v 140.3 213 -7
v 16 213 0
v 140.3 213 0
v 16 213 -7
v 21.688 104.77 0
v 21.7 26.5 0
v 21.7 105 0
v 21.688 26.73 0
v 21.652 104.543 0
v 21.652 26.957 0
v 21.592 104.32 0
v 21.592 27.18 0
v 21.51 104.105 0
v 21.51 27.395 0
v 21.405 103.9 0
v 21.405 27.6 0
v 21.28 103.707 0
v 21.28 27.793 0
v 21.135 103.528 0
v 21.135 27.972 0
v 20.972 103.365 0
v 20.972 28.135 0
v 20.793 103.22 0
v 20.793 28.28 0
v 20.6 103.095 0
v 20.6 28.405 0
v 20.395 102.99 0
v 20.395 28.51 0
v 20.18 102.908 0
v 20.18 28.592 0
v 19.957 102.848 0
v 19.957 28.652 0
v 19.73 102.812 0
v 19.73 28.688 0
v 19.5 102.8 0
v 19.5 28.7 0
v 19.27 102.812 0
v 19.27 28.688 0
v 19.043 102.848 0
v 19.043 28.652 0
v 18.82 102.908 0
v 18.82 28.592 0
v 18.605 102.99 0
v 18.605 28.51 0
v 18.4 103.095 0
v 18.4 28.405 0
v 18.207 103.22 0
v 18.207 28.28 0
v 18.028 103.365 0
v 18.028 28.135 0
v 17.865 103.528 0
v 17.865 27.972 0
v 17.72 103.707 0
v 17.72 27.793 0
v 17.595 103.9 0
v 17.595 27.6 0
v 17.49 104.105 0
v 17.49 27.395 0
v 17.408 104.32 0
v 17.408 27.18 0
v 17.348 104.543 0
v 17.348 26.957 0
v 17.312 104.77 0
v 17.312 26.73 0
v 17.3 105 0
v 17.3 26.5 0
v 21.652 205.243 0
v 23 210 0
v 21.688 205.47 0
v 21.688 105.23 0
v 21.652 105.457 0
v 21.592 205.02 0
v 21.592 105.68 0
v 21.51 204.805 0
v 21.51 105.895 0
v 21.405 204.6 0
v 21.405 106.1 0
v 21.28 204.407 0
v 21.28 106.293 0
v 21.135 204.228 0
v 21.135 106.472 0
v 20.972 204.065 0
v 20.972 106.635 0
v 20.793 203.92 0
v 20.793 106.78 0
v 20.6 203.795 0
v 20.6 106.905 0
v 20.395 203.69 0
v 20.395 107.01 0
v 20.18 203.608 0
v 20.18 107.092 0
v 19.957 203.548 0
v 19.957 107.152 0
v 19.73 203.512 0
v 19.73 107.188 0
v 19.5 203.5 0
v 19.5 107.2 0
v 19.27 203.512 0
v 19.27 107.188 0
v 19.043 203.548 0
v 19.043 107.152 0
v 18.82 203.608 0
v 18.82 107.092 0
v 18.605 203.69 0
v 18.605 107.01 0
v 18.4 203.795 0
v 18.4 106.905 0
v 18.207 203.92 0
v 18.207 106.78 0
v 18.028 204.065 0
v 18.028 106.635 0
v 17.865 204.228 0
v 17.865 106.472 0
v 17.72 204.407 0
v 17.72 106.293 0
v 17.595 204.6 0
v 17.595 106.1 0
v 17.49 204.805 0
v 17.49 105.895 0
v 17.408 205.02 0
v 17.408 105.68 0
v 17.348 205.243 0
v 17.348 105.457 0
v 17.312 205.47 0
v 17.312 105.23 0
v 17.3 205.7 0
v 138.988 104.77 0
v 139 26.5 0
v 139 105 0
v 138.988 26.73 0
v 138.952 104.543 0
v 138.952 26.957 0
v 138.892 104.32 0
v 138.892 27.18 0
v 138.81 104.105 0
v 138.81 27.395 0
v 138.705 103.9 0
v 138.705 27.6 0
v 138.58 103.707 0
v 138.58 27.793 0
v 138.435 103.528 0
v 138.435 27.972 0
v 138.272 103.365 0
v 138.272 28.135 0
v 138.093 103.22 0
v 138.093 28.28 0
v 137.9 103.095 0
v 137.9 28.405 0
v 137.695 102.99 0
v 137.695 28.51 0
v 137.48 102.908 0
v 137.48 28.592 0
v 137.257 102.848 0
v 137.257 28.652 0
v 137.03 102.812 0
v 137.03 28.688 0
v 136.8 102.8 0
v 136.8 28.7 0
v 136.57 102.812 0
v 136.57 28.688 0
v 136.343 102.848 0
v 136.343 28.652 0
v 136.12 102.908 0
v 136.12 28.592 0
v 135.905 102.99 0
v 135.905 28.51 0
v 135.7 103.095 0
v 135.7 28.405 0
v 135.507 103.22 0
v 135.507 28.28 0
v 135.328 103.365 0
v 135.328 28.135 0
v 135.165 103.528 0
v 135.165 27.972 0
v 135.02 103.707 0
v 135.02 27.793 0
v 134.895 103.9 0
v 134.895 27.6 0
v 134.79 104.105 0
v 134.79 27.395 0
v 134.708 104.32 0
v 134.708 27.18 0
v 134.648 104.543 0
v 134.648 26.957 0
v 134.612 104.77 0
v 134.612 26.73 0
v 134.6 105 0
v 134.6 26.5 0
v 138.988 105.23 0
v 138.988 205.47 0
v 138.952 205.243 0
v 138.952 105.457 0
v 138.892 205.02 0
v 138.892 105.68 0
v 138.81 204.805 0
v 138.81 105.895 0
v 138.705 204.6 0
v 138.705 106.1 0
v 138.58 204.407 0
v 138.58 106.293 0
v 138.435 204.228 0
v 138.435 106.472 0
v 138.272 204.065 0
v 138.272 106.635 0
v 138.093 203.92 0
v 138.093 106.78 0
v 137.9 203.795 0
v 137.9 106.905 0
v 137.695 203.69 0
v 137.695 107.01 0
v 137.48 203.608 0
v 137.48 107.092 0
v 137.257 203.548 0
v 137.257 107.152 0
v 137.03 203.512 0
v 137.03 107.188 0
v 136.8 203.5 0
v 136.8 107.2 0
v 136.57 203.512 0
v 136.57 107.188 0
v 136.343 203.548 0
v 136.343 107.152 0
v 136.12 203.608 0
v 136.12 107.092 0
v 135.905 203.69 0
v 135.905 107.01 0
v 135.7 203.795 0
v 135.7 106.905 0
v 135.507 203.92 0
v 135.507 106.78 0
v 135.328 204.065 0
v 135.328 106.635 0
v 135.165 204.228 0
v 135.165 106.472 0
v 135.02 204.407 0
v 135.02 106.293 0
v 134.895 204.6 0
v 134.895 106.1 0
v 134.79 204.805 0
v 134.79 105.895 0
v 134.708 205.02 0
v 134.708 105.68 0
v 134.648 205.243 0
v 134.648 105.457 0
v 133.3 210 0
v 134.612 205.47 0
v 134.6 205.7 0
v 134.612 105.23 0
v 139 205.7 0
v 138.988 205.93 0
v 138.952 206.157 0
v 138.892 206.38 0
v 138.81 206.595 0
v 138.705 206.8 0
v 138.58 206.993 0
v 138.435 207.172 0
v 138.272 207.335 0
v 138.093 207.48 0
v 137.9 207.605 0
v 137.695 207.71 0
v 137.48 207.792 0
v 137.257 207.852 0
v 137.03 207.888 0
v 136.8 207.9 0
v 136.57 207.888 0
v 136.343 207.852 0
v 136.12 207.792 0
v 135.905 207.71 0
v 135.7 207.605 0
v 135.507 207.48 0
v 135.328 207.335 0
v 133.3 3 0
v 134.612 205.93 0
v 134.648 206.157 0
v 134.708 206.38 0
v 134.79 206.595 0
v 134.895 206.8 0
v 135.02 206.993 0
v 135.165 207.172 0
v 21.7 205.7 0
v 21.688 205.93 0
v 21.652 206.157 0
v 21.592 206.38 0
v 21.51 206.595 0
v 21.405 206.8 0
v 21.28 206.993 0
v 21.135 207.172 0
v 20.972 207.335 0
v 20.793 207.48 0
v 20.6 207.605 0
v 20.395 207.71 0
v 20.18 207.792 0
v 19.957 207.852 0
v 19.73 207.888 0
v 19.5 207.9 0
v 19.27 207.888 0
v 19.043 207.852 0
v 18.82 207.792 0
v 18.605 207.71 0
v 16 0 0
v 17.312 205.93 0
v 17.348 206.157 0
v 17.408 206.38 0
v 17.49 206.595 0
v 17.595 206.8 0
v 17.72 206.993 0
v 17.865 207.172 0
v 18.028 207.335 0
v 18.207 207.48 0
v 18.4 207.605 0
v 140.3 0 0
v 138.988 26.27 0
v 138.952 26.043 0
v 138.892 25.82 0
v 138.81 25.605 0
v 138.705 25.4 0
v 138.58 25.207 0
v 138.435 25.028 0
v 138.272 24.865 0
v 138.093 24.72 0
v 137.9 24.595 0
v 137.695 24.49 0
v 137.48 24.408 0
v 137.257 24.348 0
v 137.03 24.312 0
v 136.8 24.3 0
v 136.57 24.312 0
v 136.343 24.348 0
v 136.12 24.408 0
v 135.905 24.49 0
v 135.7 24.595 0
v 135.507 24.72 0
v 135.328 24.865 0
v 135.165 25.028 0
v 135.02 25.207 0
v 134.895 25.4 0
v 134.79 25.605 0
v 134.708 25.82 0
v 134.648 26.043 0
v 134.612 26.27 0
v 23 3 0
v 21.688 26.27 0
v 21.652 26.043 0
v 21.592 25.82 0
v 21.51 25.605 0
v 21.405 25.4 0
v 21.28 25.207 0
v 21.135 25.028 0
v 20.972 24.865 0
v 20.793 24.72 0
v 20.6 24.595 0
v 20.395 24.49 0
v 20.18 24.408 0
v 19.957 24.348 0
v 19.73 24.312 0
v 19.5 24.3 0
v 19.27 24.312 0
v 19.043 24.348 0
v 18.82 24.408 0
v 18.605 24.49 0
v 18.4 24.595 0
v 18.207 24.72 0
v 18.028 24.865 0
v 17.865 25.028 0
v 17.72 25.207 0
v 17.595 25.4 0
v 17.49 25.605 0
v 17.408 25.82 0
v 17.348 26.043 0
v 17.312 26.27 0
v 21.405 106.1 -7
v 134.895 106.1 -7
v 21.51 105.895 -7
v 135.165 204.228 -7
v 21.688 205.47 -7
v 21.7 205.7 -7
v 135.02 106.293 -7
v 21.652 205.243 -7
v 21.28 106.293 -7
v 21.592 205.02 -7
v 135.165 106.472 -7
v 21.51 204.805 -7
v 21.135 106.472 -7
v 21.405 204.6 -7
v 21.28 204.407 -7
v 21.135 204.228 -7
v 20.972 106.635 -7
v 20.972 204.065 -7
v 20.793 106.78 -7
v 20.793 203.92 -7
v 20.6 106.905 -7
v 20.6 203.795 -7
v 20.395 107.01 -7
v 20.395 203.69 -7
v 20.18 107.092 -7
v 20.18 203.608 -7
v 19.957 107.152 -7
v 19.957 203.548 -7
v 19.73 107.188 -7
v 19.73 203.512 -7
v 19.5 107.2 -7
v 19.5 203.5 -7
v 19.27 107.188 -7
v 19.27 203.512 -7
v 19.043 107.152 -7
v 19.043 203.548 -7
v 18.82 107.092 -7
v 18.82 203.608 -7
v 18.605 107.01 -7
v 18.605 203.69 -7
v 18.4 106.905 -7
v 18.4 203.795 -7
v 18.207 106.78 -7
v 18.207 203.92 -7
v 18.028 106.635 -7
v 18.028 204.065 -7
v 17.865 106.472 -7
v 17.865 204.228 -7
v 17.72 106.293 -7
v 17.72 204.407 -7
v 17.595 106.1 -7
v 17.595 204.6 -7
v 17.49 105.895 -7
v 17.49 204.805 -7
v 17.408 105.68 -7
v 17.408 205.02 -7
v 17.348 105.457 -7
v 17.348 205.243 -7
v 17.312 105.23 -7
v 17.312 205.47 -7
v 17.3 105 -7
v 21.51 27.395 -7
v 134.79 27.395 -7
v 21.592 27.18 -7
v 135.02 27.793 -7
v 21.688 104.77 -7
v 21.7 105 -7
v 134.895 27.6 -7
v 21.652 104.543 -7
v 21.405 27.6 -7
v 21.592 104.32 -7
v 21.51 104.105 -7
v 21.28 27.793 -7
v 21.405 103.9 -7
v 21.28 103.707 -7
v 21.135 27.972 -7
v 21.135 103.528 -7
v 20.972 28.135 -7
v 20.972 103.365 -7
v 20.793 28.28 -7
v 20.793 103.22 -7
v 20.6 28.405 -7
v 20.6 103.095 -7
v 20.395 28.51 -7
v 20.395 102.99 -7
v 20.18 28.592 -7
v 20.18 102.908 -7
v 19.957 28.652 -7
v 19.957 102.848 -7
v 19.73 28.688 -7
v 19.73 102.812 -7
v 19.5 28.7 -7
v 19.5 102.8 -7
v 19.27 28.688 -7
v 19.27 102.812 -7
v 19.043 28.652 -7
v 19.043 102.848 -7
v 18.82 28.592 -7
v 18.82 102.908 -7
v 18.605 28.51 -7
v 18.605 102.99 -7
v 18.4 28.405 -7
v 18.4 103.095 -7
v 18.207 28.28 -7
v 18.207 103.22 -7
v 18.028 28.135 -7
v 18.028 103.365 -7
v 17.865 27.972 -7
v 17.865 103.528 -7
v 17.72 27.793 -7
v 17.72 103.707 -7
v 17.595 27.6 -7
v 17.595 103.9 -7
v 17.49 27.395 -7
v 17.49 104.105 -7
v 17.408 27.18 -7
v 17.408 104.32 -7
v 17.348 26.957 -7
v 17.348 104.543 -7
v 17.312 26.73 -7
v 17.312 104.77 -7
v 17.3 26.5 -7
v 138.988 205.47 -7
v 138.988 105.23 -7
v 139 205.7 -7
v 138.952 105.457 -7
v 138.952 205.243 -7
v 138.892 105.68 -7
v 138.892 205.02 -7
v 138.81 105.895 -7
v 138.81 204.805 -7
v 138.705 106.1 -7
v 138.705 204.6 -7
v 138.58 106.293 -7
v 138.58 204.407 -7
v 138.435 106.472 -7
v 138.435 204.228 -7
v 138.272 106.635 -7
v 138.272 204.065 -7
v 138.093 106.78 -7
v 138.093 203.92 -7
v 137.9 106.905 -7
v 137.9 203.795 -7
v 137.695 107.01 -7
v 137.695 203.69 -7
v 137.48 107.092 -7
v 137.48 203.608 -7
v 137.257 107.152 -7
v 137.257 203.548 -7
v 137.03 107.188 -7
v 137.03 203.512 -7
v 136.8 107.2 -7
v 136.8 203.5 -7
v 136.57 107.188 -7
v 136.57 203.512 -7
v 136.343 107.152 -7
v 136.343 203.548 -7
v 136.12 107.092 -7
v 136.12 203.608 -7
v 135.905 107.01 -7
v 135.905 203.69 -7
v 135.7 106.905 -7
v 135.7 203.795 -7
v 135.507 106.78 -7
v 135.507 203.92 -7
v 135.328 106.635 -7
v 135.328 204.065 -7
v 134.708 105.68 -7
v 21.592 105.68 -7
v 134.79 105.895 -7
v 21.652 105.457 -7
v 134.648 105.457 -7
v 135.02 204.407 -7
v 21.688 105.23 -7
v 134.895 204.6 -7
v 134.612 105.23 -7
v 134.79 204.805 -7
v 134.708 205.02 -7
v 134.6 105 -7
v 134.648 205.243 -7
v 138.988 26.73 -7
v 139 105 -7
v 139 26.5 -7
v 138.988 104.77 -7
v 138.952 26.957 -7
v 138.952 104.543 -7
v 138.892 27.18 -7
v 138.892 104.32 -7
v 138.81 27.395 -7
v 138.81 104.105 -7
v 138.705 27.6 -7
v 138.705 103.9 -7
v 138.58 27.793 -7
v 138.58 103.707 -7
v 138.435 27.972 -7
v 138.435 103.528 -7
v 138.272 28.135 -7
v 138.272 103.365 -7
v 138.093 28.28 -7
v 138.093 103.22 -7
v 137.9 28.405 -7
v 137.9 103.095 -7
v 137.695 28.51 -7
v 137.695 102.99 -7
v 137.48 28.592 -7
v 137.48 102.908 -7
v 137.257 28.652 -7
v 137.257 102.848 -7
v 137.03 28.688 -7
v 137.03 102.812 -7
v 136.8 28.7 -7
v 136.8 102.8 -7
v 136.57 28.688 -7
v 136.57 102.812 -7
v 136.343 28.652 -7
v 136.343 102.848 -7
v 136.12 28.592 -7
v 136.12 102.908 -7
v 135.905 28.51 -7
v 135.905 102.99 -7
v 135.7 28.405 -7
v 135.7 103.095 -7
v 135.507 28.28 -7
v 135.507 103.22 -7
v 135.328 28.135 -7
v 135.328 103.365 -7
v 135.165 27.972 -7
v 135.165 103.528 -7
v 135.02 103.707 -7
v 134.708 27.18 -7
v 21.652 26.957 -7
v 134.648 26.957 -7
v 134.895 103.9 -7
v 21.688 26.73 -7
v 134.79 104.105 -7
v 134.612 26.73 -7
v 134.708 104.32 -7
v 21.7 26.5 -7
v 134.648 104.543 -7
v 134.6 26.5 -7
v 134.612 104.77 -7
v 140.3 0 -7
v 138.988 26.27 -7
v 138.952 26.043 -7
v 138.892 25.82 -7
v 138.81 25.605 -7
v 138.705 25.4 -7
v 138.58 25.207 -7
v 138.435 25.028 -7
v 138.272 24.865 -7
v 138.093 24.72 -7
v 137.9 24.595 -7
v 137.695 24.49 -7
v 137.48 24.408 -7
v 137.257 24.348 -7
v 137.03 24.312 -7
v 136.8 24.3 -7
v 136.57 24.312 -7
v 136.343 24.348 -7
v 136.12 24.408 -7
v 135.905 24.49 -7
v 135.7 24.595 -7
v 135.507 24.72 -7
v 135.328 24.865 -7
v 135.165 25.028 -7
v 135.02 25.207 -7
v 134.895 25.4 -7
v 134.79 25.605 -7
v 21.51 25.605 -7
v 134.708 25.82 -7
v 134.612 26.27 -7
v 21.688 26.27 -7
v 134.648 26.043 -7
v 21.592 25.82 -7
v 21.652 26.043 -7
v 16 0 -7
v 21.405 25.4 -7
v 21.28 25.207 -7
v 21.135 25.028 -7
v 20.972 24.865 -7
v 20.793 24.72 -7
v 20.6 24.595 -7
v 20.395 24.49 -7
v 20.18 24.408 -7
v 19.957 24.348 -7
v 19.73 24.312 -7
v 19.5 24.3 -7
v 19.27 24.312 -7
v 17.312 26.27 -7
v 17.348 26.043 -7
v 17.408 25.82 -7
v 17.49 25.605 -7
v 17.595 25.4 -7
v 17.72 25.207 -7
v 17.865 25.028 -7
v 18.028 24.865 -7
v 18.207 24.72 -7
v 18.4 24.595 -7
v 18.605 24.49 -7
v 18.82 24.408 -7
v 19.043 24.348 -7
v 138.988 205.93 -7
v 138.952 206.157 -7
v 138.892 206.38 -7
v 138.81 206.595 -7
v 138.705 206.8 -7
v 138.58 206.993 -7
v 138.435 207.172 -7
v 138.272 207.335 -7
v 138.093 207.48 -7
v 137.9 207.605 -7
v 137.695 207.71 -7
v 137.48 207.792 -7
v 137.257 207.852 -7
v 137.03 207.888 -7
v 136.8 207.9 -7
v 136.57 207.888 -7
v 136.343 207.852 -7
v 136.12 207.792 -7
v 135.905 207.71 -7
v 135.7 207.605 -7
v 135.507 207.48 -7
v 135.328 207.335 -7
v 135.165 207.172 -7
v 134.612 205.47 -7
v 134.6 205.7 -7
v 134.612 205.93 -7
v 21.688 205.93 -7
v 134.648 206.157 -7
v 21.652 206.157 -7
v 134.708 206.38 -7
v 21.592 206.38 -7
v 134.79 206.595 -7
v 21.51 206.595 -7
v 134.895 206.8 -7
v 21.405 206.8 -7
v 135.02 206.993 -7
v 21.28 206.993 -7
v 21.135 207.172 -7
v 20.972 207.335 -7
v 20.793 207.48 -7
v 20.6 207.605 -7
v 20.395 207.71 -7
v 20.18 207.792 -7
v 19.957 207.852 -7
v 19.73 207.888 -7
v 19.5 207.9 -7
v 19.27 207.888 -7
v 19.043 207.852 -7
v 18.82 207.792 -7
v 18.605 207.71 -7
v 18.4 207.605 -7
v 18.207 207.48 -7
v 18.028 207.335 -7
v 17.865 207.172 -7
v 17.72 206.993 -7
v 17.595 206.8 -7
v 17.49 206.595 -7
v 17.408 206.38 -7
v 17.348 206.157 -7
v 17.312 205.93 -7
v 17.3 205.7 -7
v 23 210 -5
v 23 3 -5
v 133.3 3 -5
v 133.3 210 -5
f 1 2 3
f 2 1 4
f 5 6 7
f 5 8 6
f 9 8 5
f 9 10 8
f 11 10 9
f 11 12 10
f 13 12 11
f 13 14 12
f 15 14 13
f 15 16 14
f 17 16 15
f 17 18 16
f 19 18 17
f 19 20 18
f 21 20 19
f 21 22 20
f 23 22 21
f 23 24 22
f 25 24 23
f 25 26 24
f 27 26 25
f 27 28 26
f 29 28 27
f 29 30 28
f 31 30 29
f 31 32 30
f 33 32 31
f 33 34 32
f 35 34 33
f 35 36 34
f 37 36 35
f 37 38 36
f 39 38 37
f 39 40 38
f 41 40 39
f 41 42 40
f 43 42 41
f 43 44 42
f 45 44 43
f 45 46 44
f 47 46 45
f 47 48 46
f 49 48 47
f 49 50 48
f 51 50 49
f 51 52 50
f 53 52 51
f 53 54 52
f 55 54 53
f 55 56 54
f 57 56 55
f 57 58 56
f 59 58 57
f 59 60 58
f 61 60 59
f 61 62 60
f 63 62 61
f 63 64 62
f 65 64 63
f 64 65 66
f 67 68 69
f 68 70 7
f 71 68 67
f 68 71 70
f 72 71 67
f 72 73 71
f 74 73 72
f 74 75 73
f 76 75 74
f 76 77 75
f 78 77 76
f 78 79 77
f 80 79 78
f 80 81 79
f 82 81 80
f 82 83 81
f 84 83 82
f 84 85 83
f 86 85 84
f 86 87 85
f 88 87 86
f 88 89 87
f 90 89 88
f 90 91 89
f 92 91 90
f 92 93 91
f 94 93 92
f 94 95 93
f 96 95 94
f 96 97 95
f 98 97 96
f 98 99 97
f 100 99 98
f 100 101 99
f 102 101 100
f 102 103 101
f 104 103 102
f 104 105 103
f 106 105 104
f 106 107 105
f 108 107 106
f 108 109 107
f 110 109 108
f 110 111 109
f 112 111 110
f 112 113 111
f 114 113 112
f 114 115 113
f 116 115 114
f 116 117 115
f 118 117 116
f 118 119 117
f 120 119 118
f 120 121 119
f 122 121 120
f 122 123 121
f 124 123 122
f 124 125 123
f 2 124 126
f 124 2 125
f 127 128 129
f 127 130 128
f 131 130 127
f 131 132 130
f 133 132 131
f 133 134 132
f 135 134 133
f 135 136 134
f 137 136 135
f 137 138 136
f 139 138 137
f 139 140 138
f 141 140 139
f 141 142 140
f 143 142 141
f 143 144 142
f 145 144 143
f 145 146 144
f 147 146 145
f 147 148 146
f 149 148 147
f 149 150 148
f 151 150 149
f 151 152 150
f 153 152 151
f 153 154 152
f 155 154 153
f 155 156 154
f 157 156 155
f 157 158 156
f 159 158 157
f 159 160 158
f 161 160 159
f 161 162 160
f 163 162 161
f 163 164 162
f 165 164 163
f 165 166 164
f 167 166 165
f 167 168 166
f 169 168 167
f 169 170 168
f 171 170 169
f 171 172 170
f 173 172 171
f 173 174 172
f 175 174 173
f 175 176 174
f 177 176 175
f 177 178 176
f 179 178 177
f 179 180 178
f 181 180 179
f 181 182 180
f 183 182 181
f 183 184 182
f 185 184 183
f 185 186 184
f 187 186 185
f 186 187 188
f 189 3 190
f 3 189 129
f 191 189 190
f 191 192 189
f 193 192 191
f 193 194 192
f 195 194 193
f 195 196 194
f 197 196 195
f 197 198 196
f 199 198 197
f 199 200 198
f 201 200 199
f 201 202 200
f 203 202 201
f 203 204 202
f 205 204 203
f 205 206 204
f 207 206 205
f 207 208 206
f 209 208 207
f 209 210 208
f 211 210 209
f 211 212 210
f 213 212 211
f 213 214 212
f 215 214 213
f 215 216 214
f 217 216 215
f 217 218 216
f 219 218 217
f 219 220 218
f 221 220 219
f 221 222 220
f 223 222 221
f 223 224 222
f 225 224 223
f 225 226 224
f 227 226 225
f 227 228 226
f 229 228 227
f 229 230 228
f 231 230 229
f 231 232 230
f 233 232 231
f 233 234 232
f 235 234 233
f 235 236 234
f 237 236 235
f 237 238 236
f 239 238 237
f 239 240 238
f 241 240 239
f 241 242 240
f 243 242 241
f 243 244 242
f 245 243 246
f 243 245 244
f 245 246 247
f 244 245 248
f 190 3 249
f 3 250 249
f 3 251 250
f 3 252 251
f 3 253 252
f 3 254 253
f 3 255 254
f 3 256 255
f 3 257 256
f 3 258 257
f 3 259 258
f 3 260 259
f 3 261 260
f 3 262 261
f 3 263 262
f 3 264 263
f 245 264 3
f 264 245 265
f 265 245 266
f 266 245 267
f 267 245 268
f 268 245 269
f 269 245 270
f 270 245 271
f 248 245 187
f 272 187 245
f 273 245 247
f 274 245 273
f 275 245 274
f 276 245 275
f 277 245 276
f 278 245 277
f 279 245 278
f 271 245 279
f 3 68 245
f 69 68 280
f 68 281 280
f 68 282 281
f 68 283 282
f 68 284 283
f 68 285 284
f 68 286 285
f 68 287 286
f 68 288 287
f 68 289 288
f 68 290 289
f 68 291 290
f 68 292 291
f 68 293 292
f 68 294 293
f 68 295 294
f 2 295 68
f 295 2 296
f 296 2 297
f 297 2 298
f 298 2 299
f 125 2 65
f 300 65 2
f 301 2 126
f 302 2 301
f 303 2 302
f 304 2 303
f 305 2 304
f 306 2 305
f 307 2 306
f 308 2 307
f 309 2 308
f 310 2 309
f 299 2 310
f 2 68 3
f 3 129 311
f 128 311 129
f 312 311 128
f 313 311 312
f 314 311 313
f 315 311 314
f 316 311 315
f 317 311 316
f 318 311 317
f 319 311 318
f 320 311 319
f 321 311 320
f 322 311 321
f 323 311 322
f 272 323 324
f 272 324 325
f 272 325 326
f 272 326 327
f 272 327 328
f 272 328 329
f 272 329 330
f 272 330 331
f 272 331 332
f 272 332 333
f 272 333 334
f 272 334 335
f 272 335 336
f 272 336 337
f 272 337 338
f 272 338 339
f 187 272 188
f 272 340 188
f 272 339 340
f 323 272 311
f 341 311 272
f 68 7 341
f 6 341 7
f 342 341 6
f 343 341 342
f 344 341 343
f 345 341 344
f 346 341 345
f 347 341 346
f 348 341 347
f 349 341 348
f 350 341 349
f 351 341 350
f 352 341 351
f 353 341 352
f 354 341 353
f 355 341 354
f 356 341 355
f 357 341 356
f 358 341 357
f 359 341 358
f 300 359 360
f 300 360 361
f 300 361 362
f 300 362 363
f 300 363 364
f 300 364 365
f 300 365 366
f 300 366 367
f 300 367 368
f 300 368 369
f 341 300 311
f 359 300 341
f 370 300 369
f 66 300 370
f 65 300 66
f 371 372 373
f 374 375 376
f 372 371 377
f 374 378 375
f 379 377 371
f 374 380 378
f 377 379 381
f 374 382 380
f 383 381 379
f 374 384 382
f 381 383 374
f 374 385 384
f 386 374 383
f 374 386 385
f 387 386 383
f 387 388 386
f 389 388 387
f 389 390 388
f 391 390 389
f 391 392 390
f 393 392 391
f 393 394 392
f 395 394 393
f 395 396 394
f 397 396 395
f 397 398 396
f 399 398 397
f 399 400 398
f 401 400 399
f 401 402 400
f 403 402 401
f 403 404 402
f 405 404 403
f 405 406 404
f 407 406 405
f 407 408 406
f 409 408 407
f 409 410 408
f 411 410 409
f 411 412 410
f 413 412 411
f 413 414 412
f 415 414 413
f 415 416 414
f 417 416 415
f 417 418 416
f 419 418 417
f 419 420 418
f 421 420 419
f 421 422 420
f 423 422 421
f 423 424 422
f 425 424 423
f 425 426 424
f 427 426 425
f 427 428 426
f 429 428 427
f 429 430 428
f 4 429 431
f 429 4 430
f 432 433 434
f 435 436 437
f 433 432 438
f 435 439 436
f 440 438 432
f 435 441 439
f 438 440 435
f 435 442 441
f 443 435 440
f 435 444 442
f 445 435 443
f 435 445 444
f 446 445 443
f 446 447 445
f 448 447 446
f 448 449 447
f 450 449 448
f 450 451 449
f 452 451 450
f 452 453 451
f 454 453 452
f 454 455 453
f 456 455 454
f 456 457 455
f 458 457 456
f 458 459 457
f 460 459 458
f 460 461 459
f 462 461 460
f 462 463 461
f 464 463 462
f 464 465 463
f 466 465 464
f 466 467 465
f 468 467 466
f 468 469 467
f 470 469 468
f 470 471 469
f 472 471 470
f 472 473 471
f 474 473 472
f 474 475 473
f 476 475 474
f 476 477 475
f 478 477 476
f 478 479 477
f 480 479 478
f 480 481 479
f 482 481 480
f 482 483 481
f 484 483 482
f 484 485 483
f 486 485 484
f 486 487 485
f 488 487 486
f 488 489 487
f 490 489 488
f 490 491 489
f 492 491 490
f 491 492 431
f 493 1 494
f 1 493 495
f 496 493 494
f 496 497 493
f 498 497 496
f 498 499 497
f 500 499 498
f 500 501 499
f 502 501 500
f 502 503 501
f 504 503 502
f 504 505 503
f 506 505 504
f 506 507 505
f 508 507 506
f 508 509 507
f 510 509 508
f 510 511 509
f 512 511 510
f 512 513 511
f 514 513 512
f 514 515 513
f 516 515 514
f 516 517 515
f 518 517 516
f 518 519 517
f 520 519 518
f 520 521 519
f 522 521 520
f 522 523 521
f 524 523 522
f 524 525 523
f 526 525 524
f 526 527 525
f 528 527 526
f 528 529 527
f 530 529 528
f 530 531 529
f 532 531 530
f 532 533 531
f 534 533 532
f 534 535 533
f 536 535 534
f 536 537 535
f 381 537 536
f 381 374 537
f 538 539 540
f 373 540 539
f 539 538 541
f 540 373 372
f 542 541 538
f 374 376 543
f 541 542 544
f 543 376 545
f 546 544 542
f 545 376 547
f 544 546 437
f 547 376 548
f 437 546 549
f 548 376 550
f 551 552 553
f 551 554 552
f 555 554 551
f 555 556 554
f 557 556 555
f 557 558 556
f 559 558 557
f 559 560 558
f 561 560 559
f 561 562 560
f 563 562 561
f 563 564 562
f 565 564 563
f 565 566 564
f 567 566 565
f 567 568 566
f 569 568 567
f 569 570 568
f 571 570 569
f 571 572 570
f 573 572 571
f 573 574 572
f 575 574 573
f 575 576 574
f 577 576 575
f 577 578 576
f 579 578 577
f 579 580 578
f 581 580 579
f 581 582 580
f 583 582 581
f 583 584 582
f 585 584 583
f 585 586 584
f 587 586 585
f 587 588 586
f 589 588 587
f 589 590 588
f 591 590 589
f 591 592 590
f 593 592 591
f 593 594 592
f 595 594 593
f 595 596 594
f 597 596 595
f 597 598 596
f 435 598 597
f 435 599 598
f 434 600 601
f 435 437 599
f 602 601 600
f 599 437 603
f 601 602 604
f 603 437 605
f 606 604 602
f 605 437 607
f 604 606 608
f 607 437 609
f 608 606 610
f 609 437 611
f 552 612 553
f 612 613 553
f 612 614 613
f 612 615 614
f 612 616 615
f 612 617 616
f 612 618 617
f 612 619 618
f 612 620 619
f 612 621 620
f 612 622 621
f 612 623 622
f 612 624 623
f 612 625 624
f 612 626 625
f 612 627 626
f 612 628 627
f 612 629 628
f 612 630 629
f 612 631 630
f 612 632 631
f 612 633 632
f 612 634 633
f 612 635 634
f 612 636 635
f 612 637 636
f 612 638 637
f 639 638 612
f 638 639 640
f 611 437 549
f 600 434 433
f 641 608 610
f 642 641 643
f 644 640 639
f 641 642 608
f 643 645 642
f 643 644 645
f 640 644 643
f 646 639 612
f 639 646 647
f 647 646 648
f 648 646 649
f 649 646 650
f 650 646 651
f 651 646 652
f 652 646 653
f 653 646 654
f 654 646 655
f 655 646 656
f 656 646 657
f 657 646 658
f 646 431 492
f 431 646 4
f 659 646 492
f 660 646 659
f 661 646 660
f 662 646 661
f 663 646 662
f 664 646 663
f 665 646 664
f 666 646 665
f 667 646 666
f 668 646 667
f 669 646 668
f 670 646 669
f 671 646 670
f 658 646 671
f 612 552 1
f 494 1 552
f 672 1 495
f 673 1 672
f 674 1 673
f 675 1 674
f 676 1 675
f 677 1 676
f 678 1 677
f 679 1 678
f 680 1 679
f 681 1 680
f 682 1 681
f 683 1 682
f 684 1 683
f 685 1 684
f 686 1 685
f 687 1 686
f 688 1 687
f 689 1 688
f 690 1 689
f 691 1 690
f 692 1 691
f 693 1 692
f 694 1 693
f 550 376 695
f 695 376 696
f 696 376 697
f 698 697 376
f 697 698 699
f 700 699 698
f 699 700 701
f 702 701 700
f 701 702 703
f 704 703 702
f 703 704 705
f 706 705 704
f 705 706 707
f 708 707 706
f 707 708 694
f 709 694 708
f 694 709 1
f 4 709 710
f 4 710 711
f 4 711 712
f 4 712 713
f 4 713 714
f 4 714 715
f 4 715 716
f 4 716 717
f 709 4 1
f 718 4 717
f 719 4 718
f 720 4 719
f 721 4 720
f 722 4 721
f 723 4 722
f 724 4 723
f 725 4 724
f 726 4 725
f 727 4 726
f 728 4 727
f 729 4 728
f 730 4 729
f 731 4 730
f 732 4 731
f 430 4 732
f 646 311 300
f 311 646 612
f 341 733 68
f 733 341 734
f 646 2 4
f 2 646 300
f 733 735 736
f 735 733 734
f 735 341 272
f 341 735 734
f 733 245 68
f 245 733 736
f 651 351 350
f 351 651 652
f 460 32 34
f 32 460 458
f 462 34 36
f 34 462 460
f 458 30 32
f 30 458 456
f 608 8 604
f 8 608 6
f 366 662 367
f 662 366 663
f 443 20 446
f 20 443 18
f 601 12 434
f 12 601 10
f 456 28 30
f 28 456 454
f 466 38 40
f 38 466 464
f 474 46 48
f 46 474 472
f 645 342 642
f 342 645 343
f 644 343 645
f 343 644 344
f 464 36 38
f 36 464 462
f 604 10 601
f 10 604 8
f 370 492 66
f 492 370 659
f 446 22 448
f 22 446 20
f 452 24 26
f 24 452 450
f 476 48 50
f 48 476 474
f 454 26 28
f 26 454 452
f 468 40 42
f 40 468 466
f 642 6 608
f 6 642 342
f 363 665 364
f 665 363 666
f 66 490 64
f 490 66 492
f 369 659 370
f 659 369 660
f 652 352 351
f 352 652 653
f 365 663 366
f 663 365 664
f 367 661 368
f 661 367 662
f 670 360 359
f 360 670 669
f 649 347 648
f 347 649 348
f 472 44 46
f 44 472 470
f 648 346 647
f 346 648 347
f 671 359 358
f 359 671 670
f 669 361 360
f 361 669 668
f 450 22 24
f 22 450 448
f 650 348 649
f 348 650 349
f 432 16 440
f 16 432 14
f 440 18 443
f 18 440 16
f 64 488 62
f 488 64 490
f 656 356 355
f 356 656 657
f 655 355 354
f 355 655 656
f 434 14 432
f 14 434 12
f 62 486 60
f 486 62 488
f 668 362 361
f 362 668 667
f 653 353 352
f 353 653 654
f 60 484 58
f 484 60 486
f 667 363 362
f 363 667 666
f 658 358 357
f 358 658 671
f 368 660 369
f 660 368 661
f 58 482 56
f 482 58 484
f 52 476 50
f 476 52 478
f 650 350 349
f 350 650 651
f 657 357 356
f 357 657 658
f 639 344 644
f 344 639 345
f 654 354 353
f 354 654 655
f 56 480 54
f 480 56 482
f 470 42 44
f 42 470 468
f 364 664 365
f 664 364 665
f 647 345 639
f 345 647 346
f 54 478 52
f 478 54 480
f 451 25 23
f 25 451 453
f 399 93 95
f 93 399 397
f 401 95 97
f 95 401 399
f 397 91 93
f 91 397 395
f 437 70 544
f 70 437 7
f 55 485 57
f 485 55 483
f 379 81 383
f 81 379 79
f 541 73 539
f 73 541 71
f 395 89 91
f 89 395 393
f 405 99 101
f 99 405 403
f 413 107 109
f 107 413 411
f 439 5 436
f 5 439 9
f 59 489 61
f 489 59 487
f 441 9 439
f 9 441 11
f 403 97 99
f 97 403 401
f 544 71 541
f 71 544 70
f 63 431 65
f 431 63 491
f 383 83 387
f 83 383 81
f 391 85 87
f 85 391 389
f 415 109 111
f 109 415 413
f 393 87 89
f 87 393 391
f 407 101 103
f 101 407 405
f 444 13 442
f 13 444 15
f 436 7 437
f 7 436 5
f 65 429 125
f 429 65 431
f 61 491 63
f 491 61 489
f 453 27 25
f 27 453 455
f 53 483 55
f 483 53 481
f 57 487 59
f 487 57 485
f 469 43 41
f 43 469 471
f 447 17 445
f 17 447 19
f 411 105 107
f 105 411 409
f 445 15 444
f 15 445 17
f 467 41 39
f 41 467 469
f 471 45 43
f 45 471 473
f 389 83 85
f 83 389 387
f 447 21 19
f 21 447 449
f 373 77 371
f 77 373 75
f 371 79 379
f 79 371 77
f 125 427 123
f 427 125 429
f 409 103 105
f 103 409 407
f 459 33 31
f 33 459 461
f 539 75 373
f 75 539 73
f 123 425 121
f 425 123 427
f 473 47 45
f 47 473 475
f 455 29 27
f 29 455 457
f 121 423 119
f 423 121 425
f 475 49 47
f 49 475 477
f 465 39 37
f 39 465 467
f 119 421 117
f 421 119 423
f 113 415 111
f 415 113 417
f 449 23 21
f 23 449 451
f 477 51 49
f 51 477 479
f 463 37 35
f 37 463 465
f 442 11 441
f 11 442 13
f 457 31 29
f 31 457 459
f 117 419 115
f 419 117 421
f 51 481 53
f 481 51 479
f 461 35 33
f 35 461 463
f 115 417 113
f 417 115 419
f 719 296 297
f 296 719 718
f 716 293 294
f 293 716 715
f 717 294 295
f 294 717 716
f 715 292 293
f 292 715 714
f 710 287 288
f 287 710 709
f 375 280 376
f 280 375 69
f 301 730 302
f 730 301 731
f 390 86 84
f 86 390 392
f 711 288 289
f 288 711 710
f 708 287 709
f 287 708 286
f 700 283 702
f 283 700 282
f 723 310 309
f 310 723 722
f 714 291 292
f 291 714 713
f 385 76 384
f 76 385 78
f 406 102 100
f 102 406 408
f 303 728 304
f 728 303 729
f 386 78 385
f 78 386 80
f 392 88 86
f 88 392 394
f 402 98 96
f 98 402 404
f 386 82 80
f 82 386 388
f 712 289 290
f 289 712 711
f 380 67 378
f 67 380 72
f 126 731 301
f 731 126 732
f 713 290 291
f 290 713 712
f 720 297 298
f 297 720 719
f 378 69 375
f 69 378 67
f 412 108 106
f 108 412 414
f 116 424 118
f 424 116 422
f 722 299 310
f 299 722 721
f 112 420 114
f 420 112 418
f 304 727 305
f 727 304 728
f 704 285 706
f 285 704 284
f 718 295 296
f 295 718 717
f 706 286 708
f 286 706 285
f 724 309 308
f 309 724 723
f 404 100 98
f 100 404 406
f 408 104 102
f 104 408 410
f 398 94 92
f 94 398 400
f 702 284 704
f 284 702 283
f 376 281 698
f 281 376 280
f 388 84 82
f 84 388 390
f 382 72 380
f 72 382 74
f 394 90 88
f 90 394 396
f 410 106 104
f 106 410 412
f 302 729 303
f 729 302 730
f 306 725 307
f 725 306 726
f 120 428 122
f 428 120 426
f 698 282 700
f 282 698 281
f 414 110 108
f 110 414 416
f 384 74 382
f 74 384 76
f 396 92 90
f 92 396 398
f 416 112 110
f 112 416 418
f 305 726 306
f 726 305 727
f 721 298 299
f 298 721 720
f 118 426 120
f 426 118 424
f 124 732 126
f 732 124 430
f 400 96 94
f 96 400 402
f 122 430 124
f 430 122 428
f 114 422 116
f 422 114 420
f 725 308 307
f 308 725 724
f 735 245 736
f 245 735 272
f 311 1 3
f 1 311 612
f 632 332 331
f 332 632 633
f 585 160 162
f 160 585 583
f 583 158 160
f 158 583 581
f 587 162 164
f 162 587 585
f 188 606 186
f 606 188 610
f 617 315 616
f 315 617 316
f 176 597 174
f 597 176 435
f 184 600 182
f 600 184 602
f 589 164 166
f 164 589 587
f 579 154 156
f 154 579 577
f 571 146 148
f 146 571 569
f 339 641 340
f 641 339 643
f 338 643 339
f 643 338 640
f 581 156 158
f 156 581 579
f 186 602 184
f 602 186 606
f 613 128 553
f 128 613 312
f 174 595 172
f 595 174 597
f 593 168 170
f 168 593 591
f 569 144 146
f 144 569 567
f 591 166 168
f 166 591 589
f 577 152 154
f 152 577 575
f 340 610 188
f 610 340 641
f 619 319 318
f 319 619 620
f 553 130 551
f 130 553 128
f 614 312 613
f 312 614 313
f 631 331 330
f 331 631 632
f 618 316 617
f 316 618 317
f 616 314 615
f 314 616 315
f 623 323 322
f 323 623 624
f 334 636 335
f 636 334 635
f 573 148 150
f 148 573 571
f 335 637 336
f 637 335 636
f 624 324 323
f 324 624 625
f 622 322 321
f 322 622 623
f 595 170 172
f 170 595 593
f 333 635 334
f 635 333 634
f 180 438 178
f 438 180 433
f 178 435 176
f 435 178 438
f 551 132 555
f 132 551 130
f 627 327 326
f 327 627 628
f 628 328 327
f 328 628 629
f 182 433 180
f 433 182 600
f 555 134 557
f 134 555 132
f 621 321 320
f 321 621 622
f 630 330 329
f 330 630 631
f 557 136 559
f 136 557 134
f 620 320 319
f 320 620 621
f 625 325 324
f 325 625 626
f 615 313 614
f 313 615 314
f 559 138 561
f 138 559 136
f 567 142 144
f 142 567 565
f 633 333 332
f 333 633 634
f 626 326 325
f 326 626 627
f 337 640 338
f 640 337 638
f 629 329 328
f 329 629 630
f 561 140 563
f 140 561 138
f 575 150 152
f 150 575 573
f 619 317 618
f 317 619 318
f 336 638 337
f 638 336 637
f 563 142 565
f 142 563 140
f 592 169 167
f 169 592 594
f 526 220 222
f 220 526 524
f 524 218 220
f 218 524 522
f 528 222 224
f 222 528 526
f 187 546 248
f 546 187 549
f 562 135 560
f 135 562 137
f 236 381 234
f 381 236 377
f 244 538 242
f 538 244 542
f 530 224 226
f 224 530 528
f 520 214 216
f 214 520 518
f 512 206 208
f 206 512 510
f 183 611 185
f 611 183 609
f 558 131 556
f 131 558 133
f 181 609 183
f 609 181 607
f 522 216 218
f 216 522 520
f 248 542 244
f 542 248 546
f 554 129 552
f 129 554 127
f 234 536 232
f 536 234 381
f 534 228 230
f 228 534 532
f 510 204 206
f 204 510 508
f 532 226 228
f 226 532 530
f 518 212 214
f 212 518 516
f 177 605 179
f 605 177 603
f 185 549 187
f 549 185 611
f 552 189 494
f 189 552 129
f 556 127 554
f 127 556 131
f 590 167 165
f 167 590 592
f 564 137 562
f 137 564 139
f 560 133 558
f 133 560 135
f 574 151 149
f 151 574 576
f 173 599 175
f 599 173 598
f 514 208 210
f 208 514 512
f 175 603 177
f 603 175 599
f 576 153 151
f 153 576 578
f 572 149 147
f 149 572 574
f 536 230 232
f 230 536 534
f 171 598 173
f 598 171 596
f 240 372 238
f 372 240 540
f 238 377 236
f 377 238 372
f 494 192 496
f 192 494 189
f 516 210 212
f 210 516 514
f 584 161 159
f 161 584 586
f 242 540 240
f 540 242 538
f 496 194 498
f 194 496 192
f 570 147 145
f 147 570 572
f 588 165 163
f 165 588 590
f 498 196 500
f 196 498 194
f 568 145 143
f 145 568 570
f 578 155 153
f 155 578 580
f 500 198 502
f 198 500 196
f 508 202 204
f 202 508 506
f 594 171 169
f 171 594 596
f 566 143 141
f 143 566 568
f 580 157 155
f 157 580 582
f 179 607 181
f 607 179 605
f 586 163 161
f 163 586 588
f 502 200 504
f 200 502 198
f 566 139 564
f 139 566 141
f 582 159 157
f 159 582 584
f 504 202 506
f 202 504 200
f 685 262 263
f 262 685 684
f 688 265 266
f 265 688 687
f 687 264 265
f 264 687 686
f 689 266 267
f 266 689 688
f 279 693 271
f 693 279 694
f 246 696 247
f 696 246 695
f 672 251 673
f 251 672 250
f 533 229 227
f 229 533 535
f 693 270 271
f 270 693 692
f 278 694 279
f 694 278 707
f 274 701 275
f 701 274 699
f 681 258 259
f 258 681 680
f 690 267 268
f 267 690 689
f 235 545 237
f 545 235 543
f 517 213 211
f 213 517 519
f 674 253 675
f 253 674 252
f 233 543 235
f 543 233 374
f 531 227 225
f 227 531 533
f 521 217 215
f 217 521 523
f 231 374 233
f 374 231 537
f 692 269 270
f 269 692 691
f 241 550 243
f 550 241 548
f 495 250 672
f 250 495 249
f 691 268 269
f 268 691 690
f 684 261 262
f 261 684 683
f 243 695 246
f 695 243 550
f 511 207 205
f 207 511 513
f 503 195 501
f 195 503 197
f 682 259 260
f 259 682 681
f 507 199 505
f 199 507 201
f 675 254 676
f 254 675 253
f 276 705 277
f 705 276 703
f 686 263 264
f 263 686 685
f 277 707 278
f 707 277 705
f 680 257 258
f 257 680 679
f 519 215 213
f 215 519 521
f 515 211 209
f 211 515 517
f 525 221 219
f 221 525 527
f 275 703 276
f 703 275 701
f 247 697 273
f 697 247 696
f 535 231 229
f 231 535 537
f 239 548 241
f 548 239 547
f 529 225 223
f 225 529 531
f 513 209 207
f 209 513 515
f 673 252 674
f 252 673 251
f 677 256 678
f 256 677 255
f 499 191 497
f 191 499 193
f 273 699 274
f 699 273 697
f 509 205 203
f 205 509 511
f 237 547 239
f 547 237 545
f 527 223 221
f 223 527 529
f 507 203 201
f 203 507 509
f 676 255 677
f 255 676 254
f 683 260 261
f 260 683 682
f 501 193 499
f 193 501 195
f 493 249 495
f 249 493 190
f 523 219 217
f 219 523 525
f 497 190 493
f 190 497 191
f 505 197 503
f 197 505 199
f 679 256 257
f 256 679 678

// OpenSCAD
//include <fan_grille.scad>
include <inc/rack_item.scad>

top();
